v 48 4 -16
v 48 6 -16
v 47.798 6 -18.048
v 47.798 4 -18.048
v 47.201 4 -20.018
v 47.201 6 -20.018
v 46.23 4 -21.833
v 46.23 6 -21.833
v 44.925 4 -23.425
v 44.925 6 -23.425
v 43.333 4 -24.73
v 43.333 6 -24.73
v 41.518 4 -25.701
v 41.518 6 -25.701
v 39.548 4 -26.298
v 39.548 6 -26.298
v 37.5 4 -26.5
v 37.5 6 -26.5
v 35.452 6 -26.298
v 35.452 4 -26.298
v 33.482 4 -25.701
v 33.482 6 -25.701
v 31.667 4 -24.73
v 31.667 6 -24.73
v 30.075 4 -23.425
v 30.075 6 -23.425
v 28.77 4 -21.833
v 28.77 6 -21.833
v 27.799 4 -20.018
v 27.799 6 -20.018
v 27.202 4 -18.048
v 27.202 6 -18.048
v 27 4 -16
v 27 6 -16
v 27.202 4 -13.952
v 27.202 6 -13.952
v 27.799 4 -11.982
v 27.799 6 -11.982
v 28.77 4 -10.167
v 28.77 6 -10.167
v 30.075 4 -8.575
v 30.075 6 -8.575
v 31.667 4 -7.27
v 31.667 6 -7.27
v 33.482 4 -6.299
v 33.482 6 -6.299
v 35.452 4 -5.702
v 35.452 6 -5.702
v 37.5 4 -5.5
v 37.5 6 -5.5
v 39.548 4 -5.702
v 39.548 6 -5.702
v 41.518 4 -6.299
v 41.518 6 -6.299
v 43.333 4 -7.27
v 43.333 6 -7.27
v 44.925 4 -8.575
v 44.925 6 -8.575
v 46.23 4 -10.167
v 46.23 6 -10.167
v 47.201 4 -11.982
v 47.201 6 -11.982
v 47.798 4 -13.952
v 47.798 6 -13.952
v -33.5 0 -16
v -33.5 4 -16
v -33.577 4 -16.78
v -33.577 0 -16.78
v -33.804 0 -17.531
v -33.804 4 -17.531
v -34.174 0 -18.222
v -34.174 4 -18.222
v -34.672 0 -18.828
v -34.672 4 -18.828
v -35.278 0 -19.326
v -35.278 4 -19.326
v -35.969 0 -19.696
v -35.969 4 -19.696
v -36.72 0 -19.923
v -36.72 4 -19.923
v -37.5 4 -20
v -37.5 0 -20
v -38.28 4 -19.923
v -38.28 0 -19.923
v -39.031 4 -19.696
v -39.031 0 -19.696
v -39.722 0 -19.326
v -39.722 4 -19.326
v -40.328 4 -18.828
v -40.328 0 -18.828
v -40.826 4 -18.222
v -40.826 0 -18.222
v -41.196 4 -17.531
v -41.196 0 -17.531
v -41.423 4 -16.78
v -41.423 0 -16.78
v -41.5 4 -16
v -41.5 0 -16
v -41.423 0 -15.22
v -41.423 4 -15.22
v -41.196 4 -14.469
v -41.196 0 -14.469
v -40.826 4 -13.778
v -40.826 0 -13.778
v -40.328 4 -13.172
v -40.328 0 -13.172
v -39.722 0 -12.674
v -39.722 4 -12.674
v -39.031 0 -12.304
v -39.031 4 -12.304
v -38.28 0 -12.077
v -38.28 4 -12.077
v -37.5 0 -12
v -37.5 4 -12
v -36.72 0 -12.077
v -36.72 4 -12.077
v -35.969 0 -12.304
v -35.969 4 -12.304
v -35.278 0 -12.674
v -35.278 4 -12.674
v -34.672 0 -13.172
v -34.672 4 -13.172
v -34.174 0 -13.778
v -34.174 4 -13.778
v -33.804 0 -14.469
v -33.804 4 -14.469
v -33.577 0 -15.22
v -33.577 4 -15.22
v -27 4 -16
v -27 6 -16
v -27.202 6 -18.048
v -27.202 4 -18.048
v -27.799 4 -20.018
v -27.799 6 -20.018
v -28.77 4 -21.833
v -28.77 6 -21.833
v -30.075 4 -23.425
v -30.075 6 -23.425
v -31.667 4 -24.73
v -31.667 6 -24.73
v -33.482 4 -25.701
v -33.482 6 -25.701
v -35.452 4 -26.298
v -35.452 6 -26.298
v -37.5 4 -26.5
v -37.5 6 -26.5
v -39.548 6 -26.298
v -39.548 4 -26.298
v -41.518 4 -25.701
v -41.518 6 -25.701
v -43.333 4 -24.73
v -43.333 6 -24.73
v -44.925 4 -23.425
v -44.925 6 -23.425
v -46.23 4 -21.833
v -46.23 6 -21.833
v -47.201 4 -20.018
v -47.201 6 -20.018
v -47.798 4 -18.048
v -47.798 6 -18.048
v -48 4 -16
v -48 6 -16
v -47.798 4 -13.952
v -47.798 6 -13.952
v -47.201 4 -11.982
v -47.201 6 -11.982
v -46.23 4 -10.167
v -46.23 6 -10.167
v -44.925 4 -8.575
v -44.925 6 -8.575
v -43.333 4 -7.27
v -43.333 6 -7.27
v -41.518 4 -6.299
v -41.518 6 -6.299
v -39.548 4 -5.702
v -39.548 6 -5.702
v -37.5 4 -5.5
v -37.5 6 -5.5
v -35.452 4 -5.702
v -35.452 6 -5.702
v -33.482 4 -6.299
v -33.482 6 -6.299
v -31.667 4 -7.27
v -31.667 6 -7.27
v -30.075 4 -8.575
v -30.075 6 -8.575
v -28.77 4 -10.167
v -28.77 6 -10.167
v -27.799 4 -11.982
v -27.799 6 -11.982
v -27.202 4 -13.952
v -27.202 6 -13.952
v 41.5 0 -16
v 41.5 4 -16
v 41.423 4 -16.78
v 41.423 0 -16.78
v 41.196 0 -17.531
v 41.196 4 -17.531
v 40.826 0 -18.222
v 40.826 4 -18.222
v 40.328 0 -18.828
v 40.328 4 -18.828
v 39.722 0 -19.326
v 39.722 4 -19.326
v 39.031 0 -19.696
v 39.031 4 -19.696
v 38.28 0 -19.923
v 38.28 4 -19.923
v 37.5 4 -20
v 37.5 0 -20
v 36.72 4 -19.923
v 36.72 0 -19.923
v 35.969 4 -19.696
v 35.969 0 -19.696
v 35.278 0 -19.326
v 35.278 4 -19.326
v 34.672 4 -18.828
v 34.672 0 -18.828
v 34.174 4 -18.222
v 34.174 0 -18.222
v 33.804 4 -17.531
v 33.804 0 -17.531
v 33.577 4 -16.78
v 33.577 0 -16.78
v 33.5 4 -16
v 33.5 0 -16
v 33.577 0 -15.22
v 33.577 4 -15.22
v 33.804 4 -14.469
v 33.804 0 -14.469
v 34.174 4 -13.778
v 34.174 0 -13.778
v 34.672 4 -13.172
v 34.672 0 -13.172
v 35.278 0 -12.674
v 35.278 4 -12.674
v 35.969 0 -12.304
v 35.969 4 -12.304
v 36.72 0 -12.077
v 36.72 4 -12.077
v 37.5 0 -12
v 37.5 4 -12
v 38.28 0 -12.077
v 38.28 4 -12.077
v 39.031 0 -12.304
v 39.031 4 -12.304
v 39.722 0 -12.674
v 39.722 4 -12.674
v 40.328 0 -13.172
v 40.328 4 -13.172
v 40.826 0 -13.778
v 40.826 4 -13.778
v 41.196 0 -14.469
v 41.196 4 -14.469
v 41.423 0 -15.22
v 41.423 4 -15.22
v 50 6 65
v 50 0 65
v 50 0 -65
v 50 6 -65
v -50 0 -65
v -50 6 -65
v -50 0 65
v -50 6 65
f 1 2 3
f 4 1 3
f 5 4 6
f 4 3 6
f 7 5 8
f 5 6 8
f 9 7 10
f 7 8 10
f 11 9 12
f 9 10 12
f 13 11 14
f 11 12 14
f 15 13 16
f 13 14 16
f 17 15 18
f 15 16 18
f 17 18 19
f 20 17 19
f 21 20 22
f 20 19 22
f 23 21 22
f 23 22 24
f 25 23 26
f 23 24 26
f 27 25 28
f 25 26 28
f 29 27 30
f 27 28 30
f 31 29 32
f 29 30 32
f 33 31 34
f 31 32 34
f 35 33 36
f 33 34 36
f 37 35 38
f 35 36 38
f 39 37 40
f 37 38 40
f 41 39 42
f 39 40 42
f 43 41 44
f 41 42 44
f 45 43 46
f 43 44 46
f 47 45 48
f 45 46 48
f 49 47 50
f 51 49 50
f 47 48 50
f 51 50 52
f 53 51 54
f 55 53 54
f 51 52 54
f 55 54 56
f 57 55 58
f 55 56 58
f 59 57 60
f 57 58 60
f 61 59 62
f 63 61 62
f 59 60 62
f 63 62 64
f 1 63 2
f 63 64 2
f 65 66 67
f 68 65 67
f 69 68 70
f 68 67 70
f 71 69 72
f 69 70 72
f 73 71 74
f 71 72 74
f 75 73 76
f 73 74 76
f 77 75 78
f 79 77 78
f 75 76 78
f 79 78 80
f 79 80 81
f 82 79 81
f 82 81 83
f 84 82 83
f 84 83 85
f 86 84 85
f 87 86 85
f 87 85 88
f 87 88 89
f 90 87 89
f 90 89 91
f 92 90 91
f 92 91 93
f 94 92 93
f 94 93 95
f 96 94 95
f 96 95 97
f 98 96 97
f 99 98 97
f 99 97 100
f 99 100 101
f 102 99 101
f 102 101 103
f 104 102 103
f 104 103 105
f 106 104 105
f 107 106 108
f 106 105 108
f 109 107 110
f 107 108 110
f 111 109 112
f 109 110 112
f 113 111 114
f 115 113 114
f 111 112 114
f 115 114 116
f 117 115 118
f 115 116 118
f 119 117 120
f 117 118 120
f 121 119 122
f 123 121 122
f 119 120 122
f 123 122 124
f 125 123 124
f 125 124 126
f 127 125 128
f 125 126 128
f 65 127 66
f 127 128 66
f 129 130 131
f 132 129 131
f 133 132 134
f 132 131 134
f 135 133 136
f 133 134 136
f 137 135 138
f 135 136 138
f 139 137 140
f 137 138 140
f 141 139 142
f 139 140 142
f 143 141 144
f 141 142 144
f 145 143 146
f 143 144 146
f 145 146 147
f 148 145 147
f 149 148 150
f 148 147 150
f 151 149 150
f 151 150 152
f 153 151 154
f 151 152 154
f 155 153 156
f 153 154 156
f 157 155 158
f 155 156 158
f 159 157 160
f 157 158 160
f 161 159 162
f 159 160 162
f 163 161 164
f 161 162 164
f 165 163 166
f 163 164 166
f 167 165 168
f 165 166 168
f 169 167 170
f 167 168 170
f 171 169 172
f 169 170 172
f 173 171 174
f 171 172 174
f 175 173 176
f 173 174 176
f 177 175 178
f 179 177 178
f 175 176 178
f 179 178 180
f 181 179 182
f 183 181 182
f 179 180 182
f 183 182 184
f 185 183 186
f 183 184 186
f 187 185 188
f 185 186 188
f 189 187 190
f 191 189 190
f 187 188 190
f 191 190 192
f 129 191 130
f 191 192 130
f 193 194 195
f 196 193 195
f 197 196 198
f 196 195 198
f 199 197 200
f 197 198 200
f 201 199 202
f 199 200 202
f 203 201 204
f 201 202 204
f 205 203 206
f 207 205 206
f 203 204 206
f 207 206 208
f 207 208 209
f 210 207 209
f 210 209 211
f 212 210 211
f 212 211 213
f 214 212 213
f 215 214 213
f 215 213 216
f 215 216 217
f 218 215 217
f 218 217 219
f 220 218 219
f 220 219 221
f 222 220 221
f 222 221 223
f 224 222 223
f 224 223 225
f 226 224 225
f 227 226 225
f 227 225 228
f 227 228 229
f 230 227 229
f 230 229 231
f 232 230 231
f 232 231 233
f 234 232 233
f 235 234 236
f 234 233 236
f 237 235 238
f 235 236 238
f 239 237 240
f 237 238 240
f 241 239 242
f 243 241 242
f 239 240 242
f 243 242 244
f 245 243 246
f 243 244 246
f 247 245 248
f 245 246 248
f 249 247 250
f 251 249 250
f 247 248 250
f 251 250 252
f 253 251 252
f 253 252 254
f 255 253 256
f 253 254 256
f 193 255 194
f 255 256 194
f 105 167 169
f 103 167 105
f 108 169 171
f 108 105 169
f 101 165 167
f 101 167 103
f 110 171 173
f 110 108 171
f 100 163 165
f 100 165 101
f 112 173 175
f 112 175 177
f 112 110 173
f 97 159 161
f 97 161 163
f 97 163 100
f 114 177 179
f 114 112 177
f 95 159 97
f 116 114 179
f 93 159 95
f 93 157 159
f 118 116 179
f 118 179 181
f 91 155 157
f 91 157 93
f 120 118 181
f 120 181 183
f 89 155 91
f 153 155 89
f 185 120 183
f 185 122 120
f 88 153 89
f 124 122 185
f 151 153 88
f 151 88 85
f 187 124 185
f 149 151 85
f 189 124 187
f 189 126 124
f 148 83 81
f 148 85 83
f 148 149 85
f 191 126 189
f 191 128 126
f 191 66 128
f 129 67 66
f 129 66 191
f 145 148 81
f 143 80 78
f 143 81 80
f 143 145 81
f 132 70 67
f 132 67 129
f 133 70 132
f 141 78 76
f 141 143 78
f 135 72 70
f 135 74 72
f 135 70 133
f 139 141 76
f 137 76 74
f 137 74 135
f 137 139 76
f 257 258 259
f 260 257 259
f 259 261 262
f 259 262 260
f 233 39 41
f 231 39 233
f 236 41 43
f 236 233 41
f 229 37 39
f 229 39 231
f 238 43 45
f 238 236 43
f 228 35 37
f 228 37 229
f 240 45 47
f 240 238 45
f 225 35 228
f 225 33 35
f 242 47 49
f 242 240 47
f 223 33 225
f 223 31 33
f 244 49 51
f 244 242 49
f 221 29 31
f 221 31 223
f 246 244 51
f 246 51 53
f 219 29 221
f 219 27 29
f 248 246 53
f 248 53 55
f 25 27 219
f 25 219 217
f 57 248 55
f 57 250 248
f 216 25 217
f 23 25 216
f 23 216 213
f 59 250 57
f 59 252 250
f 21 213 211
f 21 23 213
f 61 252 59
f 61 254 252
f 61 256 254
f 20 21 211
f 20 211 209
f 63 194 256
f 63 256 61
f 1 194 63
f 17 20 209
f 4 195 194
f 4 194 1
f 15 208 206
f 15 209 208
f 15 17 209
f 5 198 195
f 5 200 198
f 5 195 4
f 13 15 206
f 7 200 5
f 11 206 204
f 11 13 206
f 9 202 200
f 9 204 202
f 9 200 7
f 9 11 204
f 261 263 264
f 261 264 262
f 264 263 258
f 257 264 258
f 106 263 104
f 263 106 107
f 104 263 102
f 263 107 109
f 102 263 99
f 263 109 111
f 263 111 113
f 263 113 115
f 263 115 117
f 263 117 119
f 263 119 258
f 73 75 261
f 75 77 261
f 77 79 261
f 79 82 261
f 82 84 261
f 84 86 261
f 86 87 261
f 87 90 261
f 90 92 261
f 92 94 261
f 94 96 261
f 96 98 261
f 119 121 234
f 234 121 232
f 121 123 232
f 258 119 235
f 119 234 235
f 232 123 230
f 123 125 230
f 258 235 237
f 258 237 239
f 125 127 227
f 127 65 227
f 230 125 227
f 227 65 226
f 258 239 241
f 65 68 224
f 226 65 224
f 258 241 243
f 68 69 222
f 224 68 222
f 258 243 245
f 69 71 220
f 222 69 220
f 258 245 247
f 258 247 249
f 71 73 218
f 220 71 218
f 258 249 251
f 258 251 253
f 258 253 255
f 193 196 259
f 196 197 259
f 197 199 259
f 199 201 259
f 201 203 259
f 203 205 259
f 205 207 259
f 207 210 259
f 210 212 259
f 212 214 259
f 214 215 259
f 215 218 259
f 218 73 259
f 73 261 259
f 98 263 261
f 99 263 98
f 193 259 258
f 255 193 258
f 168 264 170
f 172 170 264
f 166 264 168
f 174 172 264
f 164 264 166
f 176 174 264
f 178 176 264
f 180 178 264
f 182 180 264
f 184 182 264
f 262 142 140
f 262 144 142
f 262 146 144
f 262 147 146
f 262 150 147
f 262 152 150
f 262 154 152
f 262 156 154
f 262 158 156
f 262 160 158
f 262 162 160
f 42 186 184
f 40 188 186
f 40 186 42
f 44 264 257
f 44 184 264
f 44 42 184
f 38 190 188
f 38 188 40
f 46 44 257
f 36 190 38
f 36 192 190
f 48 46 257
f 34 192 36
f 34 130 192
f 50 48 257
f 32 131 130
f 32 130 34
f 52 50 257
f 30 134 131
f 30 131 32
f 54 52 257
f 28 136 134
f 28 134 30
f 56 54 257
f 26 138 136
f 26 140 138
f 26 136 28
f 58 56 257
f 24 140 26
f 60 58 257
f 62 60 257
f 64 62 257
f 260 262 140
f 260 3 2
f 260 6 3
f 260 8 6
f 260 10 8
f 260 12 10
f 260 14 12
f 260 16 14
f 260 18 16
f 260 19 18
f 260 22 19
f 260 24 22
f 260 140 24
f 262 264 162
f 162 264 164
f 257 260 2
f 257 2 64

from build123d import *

# Parameters (mm, degrees)
SKETCH1_W           = 100
SKETCH1_H           = 130
BOSS_EXTRUDE1_DEPTH = 6
SKETCH3_R           = 4
CUT_EXTRUDE2_DEPTH  = 7
SKETCH4_R           = 10.5
CUT_EXTRUDE3_DEPTH  = 2


with BuildPart() as part:
    # Sketch1 → Boss-Extrude1 (new body)
    with BuildSketch(Plane(origin=(0, 0, 0), x_dir=(1, 0, 0), z_dir=(0, 1, 0))):
        Rectangle(SKETCH1_W, SKETCH1_H)
    extrude(amount=BOSS_EXTRUDE1_DEPTH)

    # Sketch3 → Cut-Extrude2 (cut, through all)
    with BuildSketch(Plane(origin=(0, 6, 0), x_dir=(1, 0, 0), z_dir=(0, 1, 0))):
        with Locations((-37.5, 16)):
            Circle(SKETCH3_R)
        with Locations((37.5, 16)):
            Circle(SKETCH3_R)
    extrude(amount=-CUT_EXTRUDE2_DEPTH, mode=Mode.SUBTRACT)

    # Sketch4 → Cut-Extrude3 (cut)
    with BuildSketch(Plane(origin=(0, 6, 0), x_dir=(1, 0, 0), z_dir=(0, 1, 0))):
        with Locations((37.5, 16)):
            Circle(SKETCH4_R)
        with Locations((-37.5, 16)):
            Circle(SKETCH4_R)
    extrude(amount=-CUT_EXTRUDE3_DEPTH, mode=Mode.SUBTRACT)


solid = part.part
